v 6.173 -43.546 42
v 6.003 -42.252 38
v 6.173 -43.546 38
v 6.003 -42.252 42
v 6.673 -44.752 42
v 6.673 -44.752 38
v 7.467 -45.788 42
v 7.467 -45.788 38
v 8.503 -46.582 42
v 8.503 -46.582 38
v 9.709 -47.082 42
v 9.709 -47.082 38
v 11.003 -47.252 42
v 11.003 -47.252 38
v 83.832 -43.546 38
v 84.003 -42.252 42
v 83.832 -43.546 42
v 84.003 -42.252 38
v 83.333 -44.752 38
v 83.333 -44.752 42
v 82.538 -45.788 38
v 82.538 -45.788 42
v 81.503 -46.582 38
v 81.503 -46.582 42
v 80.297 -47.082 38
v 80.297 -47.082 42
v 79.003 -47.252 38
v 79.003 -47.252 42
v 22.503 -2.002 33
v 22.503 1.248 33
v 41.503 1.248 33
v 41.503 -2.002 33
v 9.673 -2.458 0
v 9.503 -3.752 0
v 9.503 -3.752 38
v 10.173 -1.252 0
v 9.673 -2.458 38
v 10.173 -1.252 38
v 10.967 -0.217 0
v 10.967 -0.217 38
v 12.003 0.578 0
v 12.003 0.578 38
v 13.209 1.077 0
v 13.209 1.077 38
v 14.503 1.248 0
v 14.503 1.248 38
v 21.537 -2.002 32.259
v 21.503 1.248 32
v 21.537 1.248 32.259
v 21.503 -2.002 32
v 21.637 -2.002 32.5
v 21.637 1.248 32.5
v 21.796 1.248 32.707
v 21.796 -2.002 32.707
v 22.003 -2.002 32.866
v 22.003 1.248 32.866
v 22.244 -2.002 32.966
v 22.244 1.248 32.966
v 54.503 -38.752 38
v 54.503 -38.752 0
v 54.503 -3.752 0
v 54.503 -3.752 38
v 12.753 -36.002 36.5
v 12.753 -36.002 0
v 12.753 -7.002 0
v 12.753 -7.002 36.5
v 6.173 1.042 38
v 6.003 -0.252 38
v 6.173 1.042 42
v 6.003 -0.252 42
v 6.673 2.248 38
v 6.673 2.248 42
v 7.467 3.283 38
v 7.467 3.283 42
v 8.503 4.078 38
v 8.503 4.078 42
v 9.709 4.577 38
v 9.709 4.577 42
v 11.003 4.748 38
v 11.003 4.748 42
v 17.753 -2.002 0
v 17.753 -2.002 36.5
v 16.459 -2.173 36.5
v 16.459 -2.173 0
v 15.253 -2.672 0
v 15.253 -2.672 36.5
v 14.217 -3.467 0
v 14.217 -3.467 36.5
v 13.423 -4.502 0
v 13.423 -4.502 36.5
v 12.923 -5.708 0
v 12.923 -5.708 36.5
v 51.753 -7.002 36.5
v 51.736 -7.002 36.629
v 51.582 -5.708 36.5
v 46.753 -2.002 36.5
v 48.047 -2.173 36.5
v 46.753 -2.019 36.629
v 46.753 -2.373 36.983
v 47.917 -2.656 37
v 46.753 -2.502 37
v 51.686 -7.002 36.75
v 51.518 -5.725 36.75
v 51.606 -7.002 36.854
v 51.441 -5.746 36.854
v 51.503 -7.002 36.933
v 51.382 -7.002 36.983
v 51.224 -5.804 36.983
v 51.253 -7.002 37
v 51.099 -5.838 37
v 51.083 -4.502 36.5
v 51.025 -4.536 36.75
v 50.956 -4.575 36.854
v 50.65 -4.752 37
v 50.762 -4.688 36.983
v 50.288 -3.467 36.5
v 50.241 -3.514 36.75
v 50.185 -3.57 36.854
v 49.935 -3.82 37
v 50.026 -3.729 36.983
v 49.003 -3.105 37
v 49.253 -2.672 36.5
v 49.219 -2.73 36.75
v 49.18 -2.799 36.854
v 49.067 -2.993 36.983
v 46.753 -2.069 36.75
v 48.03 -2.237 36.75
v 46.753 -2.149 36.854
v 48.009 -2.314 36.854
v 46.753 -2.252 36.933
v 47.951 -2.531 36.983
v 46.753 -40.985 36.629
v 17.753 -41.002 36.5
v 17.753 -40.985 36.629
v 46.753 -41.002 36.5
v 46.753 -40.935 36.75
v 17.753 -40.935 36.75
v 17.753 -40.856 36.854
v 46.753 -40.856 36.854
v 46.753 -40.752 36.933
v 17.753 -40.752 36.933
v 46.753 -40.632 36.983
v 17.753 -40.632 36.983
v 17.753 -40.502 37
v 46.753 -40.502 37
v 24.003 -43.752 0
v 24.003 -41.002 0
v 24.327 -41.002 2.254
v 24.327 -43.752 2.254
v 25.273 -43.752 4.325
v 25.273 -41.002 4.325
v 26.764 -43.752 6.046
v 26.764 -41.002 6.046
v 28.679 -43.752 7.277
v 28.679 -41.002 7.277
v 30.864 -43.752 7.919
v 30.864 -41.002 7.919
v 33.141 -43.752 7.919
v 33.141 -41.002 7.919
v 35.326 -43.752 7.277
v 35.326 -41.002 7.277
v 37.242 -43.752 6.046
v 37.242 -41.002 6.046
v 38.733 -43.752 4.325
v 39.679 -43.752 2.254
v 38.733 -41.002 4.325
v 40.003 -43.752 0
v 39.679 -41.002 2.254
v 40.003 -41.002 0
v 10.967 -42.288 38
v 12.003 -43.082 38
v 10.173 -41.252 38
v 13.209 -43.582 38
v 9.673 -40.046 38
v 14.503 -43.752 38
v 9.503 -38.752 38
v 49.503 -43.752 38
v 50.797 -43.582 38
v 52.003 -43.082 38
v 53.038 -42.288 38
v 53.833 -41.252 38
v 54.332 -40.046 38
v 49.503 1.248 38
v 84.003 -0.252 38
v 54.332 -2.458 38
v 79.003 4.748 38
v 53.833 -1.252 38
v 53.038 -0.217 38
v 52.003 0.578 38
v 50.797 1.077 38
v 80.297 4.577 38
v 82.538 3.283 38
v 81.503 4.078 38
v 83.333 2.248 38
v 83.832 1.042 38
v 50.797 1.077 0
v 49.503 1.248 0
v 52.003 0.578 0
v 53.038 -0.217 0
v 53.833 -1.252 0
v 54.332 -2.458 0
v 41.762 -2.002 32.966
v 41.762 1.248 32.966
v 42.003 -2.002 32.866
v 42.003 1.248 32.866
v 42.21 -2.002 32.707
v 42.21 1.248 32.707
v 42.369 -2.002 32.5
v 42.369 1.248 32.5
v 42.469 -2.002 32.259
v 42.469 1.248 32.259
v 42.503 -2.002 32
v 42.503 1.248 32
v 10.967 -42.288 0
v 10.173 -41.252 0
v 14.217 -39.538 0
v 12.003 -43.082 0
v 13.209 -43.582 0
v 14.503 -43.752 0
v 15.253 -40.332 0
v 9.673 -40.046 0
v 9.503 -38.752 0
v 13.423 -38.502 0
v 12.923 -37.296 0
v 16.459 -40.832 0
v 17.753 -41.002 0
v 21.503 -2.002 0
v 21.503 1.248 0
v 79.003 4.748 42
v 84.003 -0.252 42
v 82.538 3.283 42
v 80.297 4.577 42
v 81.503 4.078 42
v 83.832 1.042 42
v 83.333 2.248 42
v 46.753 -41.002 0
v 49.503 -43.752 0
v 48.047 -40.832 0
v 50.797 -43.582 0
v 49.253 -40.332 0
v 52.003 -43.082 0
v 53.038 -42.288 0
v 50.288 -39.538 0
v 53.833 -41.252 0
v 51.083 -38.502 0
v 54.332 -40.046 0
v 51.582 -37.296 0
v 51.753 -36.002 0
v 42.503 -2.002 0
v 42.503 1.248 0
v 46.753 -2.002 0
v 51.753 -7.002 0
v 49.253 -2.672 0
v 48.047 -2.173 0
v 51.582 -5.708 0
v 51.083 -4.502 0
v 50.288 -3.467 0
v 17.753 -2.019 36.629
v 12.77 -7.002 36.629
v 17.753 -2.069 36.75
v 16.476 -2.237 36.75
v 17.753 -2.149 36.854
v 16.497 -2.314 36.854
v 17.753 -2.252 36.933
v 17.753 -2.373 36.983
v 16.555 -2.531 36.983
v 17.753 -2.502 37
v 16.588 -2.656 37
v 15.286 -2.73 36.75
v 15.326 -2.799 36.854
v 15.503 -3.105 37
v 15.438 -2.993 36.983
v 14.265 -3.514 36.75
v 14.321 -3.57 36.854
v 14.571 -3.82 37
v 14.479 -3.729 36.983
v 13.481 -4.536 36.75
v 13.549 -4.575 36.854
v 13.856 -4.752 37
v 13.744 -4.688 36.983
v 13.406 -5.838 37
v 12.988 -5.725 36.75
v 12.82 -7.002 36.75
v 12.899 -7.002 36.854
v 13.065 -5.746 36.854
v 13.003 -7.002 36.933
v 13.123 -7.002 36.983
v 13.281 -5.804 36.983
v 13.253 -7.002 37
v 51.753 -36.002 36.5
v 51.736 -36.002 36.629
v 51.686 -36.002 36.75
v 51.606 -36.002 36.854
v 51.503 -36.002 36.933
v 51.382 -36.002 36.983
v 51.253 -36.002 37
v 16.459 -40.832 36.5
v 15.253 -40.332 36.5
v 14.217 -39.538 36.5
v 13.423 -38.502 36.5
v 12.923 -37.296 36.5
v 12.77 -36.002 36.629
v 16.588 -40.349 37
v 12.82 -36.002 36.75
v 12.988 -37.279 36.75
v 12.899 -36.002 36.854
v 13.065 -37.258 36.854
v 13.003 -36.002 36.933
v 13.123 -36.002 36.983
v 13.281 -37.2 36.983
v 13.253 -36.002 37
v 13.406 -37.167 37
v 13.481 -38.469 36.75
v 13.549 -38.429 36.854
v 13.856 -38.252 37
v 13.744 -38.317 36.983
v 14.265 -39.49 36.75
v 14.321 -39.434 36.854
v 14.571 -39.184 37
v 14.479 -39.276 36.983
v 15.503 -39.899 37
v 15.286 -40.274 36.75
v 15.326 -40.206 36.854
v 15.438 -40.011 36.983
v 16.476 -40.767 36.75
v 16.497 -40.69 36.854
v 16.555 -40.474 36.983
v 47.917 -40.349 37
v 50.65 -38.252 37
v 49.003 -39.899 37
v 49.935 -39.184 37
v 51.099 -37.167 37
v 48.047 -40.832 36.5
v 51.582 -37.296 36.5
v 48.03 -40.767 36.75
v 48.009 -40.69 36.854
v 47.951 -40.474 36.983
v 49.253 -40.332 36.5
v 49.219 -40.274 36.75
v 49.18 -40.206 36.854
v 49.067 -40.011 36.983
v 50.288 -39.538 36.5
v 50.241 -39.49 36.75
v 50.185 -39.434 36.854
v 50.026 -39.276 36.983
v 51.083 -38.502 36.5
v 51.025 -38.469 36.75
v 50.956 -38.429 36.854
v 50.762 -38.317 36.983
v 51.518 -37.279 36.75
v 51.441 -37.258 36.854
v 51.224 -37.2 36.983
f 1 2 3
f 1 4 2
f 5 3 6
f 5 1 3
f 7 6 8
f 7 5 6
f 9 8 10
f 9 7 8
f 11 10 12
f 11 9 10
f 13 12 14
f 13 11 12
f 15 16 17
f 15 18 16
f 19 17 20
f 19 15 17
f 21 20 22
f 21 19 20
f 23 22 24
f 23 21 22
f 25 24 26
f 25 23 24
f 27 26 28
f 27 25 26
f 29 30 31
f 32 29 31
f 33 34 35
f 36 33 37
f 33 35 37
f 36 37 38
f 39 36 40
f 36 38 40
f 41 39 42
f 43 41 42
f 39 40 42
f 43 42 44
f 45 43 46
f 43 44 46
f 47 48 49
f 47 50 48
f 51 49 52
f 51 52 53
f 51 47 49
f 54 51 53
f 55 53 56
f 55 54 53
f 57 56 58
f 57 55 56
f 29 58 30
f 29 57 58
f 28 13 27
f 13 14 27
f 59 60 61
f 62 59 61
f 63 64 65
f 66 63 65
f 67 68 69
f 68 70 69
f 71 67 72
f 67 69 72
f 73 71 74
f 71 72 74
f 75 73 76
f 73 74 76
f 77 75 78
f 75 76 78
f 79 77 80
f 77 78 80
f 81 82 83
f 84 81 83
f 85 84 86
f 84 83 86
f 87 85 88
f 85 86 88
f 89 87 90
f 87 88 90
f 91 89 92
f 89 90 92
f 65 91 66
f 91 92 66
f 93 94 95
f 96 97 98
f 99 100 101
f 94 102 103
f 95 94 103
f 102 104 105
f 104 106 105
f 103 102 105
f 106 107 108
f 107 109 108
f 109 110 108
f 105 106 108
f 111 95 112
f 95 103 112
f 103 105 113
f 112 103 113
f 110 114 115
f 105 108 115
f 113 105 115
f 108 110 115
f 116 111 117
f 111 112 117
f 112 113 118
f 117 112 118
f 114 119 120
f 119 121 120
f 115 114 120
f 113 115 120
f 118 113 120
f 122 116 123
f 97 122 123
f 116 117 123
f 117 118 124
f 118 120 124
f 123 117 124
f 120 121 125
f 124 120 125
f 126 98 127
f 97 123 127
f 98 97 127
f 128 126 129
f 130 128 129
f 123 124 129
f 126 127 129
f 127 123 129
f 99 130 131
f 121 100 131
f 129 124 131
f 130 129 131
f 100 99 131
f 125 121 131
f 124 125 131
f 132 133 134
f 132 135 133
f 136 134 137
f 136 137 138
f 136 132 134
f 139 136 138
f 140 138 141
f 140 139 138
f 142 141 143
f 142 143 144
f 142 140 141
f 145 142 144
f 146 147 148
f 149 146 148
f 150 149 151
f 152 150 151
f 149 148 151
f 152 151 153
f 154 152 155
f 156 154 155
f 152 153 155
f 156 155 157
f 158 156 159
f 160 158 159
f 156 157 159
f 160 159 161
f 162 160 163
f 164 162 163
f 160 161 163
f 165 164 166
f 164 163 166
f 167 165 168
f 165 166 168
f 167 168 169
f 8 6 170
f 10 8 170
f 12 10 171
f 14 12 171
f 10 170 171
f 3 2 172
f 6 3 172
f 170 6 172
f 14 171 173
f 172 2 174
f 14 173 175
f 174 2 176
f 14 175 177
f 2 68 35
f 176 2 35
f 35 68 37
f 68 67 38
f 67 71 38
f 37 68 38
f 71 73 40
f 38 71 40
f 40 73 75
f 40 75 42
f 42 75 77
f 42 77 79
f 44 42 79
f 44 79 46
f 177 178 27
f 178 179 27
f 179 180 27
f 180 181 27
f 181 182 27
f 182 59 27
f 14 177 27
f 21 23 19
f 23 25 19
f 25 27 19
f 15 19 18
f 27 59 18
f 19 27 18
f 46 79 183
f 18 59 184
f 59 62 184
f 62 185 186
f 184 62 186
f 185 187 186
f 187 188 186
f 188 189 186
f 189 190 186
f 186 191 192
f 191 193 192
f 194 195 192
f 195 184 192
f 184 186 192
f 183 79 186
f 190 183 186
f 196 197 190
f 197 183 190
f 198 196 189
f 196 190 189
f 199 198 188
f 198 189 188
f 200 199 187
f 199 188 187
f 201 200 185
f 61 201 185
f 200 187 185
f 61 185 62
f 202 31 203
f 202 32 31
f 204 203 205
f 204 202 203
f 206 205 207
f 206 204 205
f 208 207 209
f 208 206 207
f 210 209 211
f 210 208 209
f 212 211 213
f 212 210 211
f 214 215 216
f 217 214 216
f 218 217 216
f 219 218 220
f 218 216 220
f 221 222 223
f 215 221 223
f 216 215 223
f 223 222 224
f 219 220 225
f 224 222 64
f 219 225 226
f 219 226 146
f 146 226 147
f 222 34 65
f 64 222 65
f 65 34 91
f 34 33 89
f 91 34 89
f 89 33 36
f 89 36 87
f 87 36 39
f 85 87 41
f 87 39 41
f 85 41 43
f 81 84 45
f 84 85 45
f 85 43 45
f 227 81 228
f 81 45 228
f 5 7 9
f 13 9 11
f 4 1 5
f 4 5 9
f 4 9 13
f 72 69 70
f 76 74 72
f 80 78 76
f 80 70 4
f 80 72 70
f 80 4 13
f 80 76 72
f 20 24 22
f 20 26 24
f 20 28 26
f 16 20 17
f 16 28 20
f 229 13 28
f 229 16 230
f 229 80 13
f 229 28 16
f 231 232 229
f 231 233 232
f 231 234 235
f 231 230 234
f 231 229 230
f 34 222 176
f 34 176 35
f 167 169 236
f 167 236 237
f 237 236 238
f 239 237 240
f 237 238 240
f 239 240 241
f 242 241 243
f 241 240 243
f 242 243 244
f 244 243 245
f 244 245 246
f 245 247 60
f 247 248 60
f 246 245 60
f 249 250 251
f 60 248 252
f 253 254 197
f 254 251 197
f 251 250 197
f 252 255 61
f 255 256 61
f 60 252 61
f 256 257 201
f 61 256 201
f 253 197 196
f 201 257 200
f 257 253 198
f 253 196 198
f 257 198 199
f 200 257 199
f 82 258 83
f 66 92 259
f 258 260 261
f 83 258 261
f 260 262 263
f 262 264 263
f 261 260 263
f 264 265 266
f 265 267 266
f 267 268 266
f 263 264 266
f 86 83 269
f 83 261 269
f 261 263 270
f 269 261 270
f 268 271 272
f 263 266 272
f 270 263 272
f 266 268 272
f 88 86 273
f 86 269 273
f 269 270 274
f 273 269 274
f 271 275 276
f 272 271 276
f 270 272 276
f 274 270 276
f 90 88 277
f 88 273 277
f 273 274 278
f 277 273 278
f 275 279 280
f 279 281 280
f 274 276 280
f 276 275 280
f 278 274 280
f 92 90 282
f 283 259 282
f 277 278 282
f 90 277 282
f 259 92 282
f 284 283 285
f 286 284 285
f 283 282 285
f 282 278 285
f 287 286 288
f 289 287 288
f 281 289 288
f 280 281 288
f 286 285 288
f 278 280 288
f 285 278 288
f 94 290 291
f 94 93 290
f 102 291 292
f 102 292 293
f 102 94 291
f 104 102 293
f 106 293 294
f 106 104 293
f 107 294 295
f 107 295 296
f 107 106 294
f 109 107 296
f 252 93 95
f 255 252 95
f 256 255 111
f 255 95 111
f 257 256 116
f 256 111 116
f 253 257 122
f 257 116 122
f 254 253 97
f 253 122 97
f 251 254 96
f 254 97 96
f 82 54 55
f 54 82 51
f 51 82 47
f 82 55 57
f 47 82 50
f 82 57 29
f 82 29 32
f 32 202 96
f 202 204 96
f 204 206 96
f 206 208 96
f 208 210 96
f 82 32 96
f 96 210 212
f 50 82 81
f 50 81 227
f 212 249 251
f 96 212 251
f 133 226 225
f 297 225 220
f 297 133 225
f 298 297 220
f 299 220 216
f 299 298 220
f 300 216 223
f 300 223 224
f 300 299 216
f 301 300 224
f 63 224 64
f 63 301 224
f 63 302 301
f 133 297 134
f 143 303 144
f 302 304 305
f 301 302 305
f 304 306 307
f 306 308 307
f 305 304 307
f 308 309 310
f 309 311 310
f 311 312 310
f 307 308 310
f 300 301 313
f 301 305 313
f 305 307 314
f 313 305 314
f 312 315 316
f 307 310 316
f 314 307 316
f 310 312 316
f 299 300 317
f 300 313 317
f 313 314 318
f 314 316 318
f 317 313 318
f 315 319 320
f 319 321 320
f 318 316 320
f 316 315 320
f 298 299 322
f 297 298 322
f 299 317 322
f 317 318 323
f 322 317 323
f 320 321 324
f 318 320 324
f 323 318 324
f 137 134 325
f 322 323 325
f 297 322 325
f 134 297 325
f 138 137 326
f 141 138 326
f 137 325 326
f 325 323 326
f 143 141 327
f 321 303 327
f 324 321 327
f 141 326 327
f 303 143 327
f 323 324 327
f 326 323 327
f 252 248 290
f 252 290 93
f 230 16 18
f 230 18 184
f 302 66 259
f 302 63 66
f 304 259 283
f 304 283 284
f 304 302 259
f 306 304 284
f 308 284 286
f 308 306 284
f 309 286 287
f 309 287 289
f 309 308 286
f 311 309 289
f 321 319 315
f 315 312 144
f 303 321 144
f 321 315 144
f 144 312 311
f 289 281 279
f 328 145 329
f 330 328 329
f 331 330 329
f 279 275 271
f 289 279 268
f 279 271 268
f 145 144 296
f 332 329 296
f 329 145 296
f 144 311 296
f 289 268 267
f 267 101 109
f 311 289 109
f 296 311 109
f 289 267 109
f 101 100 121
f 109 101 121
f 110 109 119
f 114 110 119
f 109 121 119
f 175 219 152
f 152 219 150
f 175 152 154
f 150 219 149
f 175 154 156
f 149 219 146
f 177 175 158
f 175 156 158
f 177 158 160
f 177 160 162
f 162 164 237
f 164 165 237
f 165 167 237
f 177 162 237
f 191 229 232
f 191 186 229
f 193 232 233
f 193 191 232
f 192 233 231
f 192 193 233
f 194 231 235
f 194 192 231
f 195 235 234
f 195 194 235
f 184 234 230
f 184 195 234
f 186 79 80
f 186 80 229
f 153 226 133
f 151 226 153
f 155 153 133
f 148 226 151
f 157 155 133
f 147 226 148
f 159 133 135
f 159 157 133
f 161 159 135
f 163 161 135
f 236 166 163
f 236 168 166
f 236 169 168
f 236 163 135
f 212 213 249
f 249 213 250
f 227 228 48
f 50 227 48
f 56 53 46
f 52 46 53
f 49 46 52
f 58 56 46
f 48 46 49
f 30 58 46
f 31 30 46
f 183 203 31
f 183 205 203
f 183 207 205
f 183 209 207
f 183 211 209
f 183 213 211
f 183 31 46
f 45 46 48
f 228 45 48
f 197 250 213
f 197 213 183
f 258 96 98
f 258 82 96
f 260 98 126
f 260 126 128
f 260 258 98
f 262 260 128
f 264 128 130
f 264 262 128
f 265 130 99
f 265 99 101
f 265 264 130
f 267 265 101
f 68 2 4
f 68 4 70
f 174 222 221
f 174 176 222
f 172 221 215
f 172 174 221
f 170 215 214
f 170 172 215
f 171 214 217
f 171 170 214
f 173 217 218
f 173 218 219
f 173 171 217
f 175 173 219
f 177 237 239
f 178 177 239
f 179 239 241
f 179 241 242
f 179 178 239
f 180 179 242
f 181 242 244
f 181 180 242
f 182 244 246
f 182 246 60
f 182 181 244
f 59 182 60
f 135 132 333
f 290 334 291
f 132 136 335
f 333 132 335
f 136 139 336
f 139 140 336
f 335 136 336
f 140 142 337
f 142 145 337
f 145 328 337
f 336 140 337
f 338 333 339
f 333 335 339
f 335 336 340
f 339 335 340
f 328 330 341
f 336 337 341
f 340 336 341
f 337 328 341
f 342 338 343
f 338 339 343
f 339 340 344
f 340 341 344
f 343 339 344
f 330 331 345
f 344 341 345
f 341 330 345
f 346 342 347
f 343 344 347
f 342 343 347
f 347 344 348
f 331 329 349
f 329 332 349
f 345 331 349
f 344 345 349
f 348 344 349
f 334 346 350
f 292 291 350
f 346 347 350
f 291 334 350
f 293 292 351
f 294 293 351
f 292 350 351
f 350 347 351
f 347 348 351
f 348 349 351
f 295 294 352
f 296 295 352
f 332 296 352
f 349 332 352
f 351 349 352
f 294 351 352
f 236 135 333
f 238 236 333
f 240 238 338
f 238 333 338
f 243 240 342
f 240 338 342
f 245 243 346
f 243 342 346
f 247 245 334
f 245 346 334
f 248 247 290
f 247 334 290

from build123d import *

# Parameters (mm, degrees)
F1_W      = 45
F1_H      = 45
F2_DEPTH  = 38
F0_W      = 39
F0_H      = 39
F3_DEPTH  = 37
F4_R      = 5
F5_R      = 0.5
F6_R      = 5
F7_R      = 8
F8_DEPTH  = 45.001
F9_W      = 52
F9_H      = 52
F10_DEPTH = 4
F11_R     = 5
F13_DEPTH = 11.9
F14_R     = 1
F16_W     = 31
F16_H     = 52
F17_DEPTH = 4
F18_R     = 5


with BuildPart() as f2:
    # F1 (on Top) → F2 (new body)
    with BuildSketch(Plane.XY):
        with Locations((32.002782, -21.252214)):
            Rectangle(F1_W, F1_H)
    extrude(amount=F2_DEPTH)

    # F0 (on Top) → F3 (cut)
    with BuildSketch(Plane.XY):
        with Locations((32.252782, -21.502214)):
            Rectangle(F0_W, F0_H)
    extrude(amount=F3_DEPTH, mode=Mode.SUBTRACT)

    # F4
    f4_edges = [f2.edges().sort_by_distance(p)[0] for p in [
        (12.752782, -41.002214, 18.5),
        (51.752782, -41.002214, 18.5),
        (51.752782, -2.002214, 18.5),
        (12.752782, -2.002214, 18.5),
    ]]
    fillet(f4_edges, radius=F4_R)

    # F5
    f5_edges = [f2.edges().sort_by_distance(p)[0] for p in [
        (51.752782, -21.502214, 37),
    ]]
    fillet(f5_edges, radius=F5_R)

    # F6
    f6_edges = [f2.edges().sort_by_distance(p)[0] for p in [
        (54.502782, 1.247786, 19),
        (54.502782, -43.752214, 19),
        (9.502782, -43.752214, 19),
        (9.502782, 1.247786, 19),
    ]]
    fillet(f6_edges, radius=F6_R)

    # F7 (on face) → F8 (cut, through all)
    with BuildSketch(Plane(origin=(0, 1.247786, 0), x_dir=(-1, 0, 0), z_dir=(0, 1, 0))):
        with Locations((-32.002782, 0)):
            Circle(F7_R)
    extrude(amount=-F8_DEPTH, mode=Mode.SUBTRACT)

    # F9 (on face) → F10 (join)
    with BuildSketch(Plane.XY.offset(38)):
        with Locations((32.002782, -21.252214)):
            Rectangle(F9_W, F9_H)
    extrude(amount=F10_DEPTH)

    # F11
    f11_edges = [f2.edges().sort_by_distance(p)[0] for p in [
        (6.002782, 4.747786, 40),
        (58.002782, 4.747786, 40),
        (58.002782, -47.252214, 40),
        (6.002782, -47.252214, 40),
    ]]
    fillet(f11_edges, radius=F11_R)

    # F12 (on face) → F13 (cut)
    with BuildSketch(Plane(origin=(0, 1.247786, 0), x_dir=(-1, 0, 0), z_dir=(0, 1, 0))):
        with BuildLine():
            Line((-42.502782, 33), (-42.502782, 0))
            Line((-42.502782, 0), (-40.002782, 0))
            ThreePointArc((-40.002782, 0), (-32.002782, 8), (-24.002782, 0))
            Line((-24.002782, 0), (-21.502782, 0))
            Line((-21.502782, 0), (-21.502782, 33))
            Line((-21.502782, 33), (-42.502782, 33))
        make_face()
    extrude(amount=-F13_DEPTH, mode=Mode.SUBTRACT)

    # F14
    f14_edges = [f2.edges().sort_by_distance(p)[0] for p in [
        (21.502782, -0.377214, 33),
        (42.502782, -0.377214, 33),
    ]]
    fillet(f14_edges, radius=F14_R)

    # F16 (on face) → F17 (join)
    with BuildSketch(Plane.XY.offset(42)):
        with Locations((68.502782, -21.252214)):
            Rectangle(F16_W, F16_H)
    extrude(amount=-F17_DEPTH)

    # F18
    f18_edges = [f2.edges().sort_by_distance(p)[0] for p in [
        (84.002782, 4.747786, 40),
        (84.002782, -47.252214, 40),
    ]]
    fillet(f18_edges, radius=F18_R)


solid = f2.part
